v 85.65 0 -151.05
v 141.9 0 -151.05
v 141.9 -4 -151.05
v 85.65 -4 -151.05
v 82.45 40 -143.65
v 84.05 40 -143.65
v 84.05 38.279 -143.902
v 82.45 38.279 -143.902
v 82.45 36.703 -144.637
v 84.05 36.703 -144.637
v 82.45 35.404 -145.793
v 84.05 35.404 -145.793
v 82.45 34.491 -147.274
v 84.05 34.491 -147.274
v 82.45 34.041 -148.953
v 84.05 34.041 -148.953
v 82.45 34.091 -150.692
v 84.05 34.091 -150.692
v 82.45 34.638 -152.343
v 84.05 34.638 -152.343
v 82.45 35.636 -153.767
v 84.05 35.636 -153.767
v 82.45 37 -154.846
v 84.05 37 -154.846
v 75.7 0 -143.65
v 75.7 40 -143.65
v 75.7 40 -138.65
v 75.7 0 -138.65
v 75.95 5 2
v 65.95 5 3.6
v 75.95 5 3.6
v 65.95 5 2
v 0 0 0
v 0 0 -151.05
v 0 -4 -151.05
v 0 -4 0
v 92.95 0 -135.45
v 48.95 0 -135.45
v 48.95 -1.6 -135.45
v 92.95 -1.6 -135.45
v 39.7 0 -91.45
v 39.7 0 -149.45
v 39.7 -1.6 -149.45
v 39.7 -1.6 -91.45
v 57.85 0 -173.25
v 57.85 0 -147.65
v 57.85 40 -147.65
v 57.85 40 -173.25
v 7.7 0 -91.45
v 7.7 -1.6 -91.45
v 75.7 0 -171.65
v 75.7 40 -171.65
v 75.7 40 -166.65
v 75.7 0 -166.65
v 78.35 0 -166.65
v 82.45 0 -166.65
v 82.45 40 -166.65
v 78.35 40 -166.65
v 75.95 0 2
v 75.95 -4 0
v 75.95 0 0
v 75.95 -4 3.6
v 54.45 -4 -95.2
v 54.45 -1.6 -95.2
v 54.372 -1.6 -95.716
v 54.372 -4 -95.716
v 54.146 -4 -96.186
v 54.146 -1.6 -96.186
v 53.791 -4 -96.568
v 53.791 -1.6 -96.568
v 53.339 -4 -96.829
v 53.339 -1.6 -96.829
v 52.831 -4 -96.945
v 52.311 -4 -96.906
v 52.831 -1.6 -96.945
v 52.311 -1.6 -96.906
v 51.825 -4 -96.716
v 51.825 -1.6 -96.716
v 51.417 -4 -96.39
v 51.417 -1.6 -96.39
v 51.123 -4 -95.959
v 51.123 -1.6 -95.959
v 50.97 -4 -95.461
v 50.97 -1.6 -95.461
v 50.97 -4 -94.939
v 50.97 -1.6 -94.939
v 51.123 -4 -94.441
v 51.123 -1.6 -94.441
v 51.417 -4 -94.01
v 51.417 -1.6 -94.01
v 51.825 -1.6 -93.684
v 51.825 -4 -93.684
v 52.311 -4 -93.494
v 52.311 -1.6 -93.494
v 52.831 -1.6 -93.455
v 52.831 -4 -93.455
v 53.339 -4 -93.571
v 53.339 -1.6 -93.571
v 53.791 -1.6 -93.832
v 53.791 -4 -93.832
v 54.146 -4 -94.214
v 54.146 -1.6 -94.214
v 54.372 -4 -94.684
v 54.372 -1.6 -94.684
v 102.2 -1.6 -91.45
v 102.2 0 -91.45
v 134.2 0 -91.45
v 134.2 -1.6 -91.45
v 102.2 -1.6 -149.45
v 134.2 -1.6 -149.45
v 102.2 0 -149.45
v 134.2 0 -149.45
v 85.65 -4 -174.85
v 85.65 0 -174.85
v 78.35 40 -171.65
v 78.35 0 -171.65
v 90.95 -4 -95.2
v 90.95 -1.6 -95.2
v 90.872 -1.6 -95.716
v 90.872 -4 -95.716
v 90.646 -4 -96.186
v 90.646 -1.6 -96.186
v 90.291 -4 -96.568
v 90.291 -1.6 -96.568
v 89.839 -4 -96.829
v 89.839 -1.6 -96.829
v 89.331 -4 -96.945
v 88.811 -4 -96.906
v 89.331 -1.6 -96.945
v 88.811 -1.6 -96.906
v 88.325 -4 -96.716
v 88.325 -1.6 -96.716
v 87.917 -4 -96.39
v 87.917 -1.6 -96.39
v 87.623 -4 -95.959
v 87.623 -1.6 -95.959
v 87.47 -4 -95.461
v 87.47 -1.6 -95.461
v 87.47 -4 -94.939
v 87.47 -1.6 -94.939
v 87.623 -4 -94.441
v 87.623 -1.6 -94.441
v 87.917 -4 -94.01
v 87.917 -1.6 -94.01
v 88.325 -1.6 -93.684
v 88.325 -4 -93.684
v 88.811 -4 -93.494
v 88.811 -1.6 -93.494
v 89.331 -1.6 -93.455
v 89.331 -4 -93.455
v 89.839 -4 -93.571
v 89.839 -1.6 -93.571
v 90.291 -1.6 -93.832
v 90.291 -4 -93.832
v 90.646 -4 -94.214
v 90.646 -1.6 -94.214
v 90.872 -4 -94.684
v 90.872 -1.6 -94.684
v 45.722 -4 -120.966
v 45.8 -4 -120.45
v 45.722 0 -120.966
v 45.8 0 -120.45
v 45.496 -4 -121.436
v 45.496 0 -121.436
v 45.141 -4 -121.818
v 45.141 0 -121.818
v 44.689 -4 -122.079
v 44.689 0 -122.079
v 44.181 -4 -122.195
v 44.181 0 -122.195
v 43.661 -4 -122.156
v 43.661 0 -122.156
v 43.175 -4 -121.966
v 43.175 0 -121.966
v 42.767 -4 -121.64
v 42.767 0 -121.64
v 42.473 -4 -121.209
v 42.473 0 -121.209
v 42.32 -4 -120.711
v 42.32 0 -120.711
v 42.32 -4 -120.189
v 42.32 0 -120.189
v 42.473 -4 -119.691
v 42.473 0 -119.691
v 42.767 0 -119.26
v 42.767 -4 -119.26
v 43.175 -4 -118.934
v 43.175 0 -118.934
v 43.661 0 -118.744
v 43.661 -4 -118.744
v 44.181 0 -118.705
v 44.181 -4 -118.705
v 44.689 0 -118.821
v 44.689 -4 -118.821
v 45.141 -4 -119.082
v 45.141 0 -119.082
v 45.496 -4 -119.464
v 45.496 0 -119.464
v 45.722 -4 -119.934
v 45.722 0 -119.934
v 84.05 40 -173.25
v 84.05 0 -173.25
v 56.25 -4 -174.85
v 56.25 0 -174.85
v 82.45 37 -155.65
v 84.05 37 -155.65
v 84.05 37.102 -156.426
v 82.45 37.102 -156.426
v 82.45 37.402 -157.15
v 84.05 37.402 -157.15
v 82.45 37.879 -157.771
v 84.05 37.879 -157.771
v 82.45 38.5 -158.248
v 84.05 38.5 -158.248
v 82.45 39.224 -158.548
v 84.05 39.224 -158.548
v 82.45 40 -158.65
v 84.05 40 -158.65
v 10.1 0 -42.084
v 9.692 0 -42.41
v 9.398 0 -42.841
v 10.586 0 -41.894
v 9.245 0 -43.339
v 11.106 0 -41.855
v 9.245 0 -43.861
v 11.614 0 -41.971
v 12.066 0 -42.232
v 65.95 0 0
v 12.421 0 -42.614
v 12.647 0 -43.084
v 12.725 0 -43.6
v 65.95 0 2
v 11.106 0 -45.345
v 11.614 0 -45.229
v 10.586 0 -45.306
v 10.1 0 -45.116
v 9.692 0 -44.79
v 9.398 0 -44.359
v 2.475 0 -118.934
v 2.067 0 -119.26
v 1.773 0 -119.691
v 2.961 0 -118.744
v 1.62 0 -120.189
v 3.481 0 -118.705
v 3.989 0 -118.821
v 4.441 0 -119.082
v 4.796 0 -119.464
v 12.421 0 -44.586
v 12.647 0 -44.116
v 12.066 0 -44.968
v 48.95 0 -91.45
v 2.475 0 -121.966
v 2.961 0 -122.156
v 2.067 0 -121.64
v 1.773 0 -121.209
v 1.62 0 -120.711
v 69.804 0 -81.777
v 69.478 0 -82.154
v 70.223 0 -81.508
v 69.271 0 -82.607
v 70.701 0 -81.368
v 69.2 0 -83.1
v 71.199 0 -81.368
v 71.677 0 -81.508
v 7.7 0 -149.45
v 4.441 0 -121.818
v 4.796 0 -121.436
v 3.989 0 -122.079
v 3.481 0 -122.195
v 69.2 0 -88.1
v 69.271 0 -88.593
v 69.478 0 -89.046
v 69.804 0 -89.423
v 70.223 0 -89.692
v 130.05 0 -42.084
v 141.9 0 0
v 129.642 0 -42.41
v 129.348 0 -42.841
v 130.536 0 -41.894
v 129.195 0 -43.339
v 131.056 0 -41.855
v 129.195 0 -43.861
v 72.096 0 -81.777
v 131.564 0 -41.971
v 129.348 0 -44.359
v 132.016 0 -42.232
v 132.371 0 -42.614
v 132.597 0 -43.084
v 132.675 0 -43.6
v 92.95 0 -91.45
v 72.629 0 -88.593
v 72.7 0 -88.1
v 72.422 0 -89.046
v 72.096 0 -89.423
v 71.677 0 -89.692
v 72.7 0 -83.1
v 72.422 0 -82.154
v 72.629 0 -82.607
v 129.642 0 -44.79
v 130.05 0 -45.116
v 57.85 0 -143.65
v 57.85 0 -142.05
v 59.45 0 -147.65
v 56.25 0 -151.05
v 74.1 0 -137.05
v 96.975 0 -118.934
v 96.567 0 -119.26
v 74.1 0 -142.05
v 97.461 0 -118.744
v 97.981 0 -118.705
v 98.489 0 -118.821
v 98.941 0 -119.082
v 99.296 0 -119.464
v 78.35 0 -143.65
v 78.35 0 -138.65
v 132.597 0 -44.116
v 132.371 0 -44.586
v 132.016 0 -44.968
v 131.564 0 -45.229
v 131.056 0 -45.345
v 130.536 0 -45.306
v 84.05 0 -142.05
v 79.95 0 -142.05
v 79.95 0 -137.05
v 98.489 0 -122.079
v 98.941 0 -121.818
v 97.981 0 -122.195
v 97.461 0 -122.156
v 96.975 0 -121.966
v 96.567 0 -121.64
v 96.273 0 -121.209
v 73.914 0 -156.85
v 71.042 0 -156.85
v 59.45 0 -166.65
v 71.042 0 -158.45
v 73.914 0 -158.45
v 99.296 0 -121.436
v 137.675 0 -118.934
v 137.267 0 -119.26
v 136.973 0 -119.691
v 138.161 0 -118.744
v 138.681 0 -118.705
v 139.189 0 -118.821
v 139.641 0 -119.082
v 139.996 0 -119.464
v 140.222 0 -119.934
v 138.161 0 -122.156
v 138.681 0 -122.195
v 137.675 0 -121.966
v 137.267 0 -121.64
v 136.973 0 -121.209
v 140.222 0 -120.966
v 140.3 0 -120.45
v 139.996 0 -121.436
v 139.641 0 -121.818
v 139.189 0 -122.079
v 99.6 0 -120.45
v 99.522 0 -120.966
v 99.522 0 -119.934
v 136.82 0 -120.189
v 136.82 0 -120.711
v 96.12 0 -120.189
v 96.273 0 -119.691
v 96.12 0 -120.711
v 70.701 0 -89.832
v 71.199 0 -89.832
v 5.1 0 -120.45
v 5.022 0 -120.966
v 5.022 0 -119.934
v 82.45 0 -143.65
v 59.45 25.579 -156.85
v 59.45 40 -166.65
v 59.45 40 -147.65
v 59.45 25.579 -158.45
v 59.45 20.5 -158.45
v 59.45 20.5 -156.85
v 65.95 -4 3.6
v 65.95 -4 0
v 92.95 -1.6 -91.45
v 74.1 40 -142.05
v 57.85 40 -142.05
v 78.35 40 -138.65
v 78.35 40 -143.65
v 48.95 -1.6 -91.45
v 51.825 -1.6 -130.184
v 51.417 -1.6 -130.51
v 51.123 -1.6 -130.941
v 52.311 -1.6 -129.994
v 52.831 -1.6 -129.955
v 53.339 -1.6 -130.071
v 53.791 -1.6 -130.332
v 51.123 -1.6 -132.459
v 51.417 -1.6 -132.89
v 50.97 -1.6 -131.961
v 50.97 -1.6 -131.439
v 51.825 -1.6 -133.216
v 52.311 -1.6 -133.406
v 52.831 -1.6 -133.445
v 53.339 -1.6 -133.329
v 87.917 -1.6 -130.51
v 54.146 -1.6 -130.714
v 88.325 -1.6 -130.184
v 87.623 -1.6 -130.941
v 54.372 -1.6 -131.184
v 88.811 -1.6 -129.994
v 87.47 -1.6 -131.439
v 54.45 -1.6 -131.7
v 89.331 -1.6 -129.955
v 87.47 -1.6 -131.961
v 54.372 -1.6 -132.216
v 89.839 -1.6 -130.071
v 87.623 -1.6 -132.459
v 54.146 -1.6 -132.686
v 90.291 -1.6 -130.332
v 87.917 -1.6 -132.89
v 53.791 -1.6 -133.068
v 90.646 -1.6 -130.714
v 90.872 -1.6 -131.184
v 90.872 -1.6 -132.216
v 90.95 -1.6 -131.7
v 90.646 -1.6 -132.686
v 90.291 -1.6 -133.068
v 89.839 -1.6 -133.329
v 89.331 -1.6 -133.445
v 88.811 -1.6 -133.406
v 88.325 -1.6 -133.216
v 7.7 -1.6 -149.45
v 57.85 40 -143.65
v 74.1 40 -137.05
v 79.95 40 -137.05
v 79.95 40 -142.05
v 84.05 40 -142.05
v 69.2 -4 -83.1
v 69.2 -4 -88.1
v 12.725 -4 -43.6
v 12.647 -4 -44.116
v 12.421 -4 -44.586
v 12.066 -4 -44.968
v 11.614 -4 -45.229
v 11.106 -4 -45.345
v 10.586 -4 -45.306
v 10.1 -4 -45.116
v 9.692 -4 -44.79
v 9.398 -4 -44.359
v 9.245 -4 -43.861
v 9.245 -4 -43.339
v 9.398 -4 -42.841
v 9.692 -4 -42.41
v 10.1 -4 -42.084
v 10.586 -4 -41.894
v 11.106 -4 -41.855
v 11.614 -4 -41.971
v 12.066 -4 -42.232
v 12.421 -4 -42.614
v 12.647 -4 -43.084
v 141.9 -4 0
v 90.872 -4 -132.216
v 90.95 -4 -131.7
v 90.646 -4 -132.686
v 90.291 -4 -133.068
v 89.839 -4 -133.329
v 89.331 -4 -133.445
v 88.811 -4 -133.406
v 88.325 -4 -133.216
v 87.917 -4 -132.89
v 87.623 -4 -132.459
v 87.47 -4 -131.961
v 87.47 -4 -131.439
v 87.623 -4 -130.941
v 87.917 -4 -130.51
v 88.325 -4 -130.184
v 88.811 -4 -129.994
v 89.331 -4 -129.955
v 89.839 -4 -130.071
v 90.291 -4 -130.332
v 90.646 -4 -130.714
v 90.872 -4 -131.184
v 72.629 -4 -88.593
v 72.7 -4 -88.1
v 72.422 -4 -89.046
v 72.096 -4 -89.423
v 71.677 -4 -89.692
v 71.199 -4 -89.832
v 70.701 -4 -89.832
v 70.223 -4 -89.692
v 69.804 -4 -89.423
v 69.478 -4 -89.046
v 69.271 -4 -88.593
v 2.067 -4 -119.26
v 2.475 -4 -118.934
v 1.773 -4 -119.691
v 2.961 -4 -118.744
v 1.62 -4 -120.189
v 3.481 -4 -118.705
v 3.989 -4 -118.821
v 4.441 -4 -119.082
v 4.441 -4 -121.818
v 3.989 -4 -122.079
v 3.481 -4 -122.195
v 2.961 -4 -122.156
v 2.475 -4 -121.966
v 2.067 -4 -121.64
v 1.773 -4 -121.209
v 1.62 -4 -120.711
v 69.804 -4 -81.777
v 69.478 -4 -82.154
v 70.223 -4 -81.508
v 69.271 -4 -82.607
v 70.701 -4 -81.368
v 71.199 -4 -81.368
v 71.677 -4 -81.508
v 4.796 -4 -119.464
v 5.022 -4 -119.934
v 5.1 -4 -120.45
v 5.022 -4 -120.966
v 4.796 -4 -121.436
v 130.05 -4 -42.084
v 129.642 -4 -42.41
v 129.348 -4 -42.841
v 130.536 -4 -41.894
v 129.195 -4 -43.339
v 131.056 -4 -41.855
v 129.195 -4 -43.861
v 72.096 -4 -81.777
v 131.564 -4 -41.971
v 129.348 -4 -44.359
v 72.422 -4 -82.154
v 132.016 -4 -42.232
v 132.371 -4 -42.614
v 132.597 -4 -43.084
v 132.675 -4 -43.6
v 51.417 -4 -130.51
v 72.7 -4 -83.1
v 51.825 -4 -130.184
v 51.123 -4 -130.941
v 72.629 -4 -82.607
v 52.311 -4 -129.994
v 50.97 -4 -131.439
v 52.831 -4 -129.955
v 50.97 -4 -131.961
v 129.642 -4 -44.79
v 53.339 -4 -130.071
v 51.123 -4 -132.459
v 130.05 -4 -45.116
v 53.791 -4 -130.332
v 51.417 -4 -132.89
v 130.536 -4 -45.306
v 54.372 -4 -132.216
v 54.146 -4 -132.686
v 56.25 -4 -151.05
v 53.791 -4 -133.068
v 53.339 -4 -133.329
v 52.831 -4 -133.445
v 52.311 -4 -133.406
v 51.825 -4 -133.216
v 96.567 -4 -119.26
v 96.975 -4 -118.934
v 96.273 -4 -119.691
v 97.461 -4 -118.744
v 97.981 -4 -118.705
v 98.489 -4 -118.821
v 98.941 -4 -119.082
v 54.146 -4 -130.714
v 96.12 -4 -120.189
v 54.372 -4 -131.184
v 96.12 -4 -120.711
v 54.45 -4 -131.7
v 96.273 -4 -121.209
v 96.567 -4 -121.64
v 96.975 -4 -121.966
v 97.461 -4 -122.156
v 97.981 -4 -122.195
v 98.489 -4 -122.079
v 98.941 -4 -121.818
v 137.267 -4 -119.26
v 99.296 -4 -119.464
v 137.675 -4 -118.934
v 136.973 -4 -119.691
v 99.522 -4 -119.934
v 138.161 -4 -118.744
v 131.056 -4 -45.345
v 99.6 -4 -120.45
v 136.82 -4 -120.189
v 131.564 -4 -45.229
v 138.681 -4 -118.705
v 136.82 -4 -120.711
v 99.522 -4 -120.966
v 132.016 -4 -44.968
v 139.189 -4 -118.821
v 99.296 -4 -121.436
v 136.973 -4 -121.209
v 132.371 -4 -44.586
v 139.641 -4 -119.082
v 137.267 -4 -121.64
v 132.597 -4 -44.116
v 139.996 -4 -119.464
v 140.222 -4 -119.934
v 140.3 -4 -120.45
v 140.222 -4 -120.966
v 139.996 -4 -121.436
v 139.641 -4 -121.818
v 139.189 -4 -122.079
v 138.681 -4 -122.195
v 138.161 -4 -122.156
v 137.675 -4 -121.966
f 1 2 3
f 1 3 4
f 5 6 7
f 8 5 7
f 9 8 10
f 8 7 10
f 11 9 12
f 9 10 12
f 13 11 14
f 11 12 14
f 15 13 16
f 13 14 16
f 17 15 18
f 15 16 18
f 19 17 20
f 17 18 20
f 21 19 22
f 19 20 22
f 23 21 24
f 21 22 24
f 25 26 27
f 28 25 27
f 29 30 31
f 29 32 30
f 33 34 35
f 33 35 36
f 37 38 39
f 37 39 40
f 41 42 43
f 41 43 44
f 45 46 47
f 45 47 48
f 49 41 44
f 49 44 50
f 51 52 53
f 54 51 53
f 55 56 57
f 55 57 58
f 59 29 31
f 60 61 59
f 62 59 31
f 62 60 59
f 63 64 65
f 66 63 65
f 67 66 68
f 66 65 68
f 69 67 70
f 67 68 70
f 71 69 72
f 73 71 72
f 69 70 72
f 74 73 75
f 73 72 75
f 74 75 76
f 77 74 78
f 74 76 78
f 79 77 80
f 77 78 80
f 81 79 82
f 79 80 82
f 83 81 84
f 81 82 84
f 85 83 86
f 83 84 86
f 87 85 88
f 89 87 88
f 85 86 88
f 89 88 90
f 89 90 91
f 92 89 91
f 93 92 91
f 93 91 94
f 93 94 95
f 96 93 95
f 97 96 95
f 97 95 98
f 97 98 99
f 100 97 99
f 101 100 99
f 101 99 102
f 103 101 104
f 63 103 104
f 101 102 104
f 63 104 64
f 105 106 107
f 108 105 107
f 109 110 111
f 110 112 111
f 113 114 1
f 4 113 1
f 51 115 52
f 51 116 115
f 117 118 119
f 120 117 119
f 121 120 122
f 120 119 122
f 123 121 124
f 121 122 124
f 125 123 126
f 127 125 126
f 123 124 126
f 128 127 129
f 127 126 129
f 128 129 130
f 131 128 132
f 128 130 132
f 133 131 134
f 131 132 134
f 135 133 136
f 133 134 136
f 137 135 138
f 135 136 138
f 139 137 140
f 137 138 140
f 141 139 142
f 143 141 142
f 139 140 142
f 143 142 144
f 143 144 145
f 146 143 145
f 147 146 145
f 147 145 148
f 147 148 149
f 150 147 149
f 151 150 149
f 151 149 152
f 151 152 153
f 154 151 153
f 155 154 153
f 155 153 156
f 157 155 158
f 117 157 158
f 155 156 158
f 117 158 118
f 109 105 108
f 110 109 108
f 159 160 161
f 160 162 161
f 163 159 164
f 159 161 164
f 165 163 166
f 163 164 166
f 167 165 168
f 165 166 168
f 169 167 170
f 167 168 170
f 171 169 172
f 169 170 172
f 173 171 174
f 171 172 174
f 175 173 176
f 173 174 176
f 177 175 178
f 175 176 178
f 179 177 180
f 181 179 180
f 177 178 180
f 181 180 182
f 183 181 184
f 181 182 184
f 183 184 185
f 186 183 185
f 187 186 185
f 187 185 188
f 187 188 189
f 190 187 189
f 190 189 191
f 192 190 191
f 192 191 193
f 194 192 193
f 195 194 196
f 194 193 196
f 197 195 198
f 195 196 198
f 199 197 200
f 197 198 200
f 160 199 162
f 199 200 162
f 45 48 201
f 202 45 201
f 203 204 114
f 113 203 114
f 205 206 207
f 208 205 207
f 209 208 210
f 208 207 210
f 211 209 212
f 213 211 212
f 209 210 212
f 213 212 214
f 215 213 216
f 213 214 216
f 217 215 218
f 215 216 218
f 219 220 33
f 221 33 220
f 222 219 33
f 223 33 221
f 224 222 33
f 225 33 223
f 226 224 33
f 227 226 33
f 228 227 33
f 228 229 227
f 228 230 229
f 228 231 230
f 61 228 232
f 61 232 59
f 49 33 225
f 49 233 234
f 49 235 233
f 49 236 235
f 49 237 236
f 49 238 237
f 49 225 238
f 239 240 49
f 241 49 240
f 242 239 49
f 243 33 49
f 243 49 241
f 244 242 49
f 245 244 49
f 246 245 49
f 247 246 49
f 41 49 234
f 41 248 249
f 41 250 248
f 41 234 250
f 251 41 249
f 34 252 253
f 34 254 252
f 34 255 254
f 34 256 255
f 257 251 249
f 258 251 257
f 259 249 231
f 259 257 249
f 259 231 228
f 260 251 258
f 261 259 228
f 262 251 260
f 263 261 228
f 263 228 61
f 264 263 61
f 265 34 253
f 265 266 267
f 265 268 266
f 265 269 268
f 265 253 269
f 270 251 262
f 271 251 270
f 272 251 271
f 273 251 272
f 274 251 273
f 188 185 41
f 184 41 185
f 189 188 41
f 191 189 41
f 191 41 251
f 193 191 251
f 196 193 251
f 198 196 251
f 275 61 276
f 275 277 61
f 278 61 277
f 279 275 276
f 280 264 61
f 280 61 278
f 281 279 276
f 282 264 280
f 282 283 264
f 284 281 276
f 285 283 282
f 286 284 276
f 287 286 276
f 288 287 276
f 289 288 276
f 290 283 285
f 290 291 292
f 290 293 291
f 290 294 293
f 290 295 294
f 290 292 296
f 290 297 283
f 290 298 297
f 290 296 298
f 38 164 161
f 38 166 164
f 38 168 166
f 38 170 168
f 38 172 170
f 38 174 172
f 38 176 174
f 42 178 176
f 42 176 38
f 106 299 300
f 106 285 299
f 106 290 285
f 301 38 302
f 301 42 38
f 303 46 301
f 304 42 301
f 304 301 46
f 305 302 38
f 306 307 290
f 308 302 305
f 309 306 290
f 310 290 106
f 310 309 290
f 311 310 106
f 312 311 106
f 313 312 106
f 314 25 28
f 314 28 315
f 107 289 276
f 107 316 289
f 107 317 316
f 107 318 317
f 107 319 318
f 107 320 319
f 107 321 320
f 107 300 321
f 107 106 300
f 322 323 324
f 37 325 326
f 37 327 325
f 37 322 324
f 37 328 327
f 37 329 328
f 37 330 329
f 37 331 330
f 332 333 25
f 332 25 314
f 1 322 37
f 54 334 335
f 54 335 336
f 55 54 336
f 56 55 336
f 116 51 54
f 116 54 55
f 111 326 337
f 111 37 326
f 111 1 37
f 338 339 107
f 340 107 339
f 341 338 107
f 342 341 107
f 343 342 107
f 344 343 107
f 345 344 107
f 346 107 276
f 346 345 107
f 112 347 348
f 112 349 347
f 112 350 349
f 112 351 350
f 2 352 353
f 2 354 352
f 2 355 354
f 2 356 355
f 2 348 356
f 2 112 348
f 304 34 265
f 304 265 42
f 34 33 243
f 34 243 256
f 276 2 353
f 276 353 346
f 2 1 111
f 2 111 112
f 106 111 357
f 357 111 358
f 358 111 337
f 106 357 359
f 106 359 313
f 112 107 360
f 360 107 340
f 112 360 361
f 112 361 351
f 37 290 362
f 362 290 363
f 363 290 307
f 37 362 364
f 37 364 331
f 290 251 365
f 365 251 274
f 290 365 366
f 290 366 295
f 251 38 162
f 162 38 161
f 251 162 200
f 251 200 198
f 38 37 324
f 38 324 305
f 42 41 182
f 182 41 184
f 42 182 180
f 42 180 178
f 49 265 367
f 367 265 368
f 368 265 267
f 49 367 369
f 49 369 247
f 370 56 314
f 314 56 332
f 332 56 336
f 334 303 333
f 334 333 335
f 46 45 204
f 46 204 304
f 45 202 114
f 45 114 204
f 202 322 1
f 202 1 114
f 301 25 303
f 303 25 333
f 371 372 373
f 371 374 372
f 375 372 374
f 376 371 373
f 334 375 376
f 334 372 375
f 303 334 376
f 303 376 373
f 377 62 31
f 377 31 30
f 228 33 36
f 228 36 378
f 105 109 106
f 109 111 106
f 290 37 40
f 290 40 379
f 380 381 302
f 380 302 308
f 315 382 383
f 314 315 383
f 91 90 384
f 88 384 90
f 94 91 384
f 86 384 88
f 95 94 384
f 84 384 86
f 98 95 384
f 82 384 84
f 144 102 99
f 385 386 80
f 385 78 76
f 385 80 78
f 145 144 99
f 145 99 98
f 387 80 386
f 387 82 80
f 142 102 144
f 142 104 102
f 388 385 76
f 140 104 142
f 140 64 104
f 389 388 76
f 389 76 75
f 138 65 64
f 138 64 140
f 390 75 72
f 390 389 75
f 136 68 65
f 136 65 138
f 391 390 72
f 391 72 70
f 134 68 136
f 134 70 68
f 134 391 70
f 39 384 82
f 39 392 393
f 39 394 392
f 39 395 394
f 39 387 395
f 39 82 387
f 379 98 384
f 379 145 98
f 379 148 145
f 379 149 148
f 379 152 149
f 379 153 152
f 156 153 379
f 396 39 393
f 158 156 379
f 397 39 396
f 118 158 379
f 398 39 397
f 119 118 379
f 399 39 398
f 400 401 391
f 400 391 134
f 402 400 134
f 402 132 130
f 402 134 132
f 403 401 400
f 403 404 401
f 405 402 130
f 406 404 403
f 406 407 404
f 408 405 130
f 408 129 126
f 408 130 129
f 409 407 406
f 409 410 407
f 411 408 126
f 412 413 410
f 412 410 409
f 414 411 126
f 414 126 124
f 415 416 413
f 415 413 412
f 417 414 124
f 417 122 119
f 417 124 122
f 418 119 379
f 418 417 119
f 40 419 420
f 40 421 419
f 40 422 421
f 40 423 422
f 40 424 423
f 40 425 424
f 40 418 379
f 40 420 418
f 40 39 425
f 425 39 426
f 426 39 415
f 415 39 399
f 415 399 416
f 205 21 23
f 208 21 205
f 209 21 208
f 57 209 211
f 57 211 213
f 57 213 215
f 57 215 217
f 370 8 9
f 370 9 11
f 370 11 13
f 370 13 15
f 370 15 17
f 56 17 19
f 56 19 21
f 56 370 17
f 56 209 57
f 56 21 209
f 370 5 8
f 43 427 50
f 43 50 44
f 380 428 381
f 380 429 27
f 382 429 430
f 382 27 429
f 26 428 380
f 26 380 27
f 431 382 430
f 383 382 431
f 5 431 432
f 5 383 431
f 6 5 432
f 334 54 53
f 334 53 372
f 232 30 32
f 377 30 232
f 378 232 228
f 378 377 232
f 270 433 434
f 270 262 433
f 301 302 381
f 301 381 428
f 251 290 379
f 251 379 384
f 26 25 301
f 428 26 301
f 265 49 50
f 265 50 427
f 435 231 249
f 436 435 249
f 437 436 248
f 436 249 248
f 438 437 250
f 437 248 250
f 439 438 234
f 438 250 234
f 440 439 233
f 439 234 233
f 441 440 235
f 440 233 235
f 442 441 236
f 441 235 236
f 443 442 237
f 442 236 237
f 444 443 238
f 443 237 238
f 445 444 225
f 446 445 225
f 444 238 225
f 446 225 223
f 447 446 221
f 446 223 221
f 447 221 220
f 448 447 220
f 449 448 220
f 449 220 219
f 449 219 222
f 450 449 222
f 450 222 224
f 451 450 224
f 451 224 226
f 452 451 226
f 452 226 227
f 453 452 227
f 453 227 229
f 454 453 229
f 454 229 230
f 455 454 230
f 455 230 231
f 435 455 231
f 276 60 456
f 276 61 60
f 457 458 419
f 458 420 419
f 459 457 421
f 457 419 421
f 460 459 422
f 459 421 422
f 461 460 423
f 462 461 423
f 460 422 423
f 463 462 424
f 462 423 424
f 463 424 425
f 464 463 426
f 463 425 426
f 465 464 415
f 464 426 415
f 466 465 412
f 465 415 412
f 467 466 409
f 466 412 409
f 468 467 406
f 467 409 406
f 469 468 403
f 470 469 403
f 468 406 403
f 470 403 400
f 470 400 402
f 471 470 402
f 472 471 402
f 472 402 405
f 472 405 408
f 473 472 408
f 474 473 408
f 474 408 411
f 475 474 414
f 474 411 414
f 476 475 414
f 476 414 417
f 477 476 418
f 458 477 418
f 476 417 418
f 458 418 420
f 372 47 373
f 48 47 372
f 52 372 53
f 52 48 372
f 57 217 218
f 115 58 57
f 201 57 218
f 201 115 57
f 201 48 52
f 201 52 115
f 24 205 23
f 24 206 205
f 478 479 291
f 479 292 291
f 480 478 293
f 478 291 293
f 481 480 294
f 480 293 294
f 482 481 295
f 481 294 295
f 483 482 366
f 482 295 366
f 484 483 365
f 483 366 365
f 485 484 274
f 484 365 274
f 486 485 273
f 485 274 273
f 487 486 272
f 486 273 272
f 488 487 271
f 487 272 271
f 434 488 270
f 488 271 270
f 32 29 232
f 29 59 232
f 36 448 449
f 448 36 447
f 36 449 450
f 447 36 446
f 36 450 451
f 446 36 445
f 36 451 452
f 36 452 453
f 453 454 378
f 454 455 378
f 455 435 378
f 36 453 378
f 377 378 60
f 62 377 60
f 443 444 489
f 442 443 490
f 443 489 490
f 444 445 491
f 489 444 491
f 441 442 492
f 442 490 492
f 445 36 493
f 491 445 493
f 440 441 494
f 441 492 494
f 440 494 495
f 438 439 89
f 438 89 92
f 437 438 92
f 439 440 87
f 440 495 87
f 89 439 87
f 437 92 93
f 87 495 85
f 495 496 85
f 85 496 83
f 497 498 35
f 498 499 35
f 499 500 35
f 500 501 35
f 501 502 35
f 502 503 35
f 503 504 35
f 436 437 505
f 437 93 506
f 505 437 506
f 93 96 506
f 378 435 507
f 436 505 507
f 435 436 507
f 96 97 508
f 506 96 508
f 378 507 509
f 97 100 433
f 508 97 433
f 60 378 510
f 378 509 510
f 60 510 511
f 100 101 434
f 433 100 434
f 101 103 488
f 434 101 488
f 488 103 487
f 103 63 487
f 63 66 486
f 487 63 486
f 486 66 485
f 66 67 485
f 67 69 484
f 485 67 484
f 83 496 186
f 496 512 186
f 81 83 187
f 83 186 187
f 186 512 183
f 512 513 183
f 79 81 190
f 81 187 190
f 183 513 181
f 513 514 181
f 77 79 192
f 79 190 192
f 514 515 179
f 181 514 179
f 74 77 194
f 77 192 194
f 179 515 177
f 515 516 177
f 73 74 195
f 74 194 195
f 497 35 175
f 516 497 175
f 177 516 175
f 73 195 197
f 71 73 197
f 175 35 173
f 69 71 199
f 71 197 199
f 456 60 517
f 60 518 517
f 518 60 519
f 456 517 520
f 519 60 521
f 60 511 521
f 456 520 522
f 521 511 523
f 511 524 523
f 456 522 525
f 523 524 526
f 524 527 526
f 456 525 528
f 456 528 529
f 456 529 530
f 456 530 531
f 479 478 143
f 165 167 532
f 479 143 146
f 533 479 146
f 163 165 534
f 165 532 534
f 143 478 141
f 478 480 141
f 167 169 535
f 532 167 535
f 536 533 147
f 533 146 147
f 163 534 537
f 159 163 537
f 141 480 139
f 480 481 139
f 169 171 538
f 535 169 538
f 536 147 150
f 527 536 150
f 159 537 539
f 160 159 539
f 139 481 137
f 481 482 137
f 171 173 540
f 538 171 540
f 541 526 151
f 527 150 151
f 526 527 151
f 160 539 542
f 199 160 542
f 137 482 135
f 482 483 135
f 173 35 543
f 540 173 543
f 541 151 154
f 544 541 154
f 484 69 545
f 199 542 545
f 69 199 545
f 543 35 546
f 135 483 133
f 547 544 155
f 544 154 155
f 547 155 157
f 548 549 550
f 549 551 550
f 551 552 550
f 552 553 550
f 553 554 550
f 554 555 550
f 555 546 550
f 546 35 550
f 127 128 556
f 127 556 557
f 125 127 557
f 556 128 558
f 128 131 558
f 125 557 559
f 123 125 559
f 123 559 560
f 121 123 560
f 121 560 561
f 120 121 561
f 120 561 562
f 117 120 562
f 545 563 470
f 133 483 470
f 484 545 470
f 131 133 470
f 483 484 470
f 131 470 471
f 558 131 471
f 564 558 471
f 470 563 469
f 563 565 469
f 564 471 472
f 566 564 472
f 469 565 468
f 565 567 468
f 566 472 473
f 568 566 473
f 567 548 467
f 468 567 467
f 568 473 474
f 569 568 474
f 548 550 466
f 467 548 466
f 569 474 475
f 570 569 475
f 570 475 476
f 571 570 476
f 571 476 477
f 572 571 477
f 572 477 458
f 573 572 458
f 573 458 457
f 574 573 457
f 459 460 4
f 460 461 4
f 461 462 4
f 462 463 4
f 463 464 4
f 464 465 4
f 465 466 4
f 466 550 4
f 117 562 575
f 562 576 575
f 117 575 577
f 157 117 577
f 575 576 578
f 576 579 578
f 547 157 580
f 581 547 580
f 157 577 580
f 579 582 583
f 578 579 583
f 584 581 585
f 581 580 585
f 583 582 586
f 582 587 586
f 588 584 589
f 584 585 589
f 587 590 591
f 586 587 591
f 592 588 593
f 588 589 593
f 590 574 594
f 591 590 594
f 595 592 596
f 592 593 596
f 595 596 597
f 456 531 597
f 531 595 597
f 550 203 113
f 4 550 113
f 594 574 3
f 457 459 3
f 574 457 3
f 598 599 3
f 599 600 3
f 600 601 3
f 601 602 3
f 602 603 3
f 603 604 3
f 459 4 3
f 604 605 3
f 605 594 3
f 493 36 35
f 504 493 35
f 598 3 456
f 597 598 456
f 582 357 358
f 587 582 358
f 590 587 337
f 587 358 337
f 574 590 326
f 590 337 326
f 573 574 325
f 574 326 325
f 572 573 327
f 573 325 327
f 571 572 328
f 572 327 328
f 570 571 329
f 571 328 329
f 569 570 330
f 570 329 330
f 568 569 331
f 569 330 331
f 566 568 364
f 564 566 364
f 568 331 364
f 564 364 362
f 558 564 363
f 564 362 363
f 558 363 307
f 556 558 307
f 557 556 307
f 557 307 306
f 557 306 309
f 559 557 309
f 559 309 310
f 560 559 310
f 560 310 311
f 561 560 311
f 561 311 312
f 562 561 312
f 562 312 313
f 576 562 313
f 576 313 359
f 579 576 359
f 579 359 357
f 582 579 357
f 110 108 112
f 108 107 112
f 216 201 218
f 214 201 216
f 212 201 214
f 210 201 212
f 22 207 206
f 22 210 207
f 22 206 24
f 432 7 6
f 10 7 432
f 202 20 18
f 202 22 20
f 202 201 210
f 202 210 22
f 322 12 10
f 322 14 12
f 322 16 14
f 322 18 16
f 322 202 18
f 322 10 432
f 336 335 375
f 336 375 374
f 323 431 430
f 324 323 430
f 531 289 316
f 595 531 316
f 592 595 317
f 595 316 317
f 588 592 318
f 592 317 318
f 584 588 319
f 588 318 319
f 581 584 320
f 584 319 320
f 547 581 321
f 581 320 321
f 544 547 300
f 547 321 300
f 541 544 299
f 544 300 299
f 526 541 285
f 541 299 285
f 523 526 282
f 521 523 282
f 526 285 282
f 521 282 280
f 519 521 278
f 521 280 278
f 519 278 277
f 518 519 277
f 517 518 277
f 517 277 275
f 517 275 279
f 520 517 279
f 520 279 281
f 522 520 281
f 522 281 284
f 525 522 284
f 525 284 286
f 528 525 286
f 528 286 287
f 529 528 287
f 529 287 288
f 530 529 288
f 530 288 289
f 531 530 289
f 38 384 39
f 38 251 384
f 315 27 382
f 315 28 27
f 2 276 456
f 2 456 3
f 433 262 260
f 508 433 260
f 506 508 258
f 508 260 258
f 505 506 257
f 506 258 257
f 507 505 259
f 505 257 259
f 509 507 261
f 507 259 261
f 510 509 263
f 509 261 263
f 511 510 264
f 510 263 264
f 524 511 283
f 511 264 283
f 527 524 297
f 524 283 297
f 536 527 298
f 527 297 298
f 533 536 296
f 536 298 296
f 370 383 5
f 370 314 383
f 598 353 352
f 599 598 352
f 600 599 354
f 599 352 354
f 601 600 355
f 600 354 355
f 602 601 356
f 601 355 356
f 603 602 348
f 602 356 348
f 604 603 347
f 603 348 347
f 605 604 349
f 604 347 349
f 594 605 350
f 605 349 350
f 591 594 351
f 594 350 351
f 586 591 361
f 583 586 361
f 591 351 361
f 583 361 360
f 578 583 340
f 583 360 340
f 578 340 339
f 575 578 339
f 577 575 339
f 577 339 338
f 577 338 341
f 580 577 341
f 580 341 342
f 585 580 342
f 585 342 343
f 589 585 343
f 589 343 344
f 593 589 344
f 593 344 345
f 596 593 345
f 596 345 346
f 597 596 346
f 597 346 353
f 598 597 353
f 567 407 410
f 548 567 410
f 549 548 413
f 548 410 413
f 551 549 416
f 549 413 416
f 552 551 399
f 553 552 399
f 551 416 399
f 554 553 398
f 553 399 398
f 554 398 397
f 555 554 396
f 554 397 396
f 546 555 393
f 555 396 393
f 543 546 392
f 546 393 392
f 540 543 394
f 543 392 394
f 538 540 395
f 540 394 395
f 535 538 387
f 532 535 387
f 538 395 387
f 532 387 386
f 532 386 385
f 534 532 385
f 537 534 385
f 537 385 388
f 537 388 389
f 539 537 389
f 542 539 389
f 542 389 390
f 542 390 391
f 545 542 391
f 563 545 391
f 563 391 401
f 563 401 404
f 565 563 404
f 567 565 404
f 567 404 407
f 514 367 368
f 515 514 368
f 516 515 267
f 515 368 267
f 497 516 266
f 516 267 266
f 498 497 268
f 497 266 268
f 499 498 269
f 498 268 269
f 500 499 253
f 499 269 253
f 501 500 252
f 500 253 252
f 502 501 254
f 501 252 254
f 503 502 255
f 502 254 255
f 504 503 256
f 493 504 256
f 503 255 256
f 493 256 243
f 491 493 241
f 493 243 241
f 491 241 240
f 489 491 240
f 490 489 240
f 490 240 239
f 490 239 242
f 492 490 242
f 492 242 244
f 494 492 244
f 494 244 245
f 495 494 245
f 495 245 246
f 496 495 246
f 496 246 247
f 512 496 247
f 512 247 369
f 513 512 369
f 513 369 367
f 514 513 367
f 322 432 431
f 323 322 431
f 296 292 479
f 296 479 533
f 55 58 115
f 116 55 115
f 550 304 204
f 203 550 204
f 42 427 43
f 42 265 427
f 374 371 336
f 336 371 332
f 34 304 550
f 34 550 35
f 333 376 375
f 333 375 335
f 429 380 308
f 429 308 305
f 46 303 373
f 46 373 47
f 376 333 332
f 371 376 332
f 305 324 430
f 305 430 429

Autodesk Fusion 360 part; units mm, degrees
sketch "Sketch2" plane through (0, 0, 0) normal (1, 0, 0) x (0, 0, -1)
  line L0 (0, 0) -> (0, 10)
  dimension "d53" = 10
sketch "Sketch1" plane through (0, 0, 0) normal (0, 1, 0) x (1, 0, 0)
  line L0 (0, 0) -> (141.9, 0)
  line L1 (141.9, 0) -> (141.9, 151.05)
  line L2 (0, 151.05) -> (0, 0)
  line L3 (130.925, 43.6) -> (10.975, 43.6) construction
  circle A0 centre (10.975, 43.6) radius 1.75
  circle A1 centre (130.925, 43.6) radius 1.75
  line L4 (70.95, 0) -> (70.95, 43.6) construction
  line L5 (65.95, 0) -> (68.5, 0)
  line L6 (70.95, -2) -> (65.95, -2)
  line L7 (65.95, -2) -> (65.95, 0)
  line L8 (75.95, -2) -> (75.95, 0)
  line L9 (70.95, -2) -> (75.95, -2)
  line L10 (70.95, 43.6) -> (70.95, 85.6) construction
  line L11 (72.7, 88.1) -> (72.7, 83.1)
  line L12 (69.2, 83.1) -> (69.2, 88.1)
  arc A2 (72.7, 88.1) -> (69.2, 88.1) centre (70.95, 88.1) ccw
  arc A3 (69.2, 83.1) -> (72.7, 83.1) centre (70.95, 83.1) ccw
  line L13 (69.2, 85.6) -> (72.7, 85.6) construction
  line L14 (3.35, 120.45) -> (44.05, 120.45) construction
  circle A4 centre (3.35, 120.45) radius 1.75
  circle A5 centre (44.05, 120.45) radius 1.75
  line L15 (23.7, 151.05) -> (23.7, 120.45) construction
  line L16 (7.7, 149.45) -> (39.7, 149.45)
  line L17 (39.7, 149.45) -> (39.7, 91.45)
  line L18 (39.7, 91.45) -> (7.7, 91.45)
  line L19 (7.7, 91.45) -> (7.7, 149.45)
  line L20 (134.2, 91.45) -> (134.2, 149.45)
  line L21 (134.2, 149.45) -> (102.2, 149.45)
  line L22 (102.2, 149.45) -> (102.2, 91.45)
  circle A6 centre (138.55, 120.45) radius 1.75
  line L23 (102.2, 91.45) -> (134.2, 91.45)
  circle A7 centre (97.85, 120.45) radius 1.75
  line L24 (48.95, 135.45) -> (92.95, 135.45)
  line L25 (92.95, 135.45) -> (92.95, 91.45)
  line L26 (92.95, 91.45) -> (48.95, 91.45)
  line L27 (48.95, 91.45) -> (48.95, 135.45)
  line L28 (48.95, 113.45) -> (39.7, 113.45) construction
  line L29 (92.95, 113.45) -> (102.2, 113.45) construction
  circle A8 centre (52.7, 131.7) radius 1.75
  circle A9 centre (52.7, 95.2) radius 1.75
  circle A10 centre (89.2, 95.2) radius 1.75
  circle A11 centre (89.2, 131.7) radius 1.75
  line L30 (74.1, 142.05) -> (74.1, 137.05)
  line L31 (74.1, 173.25) -> (74.1, 168.25)
  line L32 (82.45, 143.65) -> (82.45, 166.65)
  line L33 (74.1, 173.25) -> (79.95, 173.25)
  line L34 (57.85, 142.05) -> (74.1, 142.05)
  line L35 (74.1, 168.25) -> (57.85, 168.25)
  line L36 (57.85, 142.05) -> (57.85, 168.25)
  line L37 (78.35, 138.65) -> (78.35, 143.65)
  line L38 (78.35, 166.65) -> (78.35, 171.65)
  line L39 (82.45, 166.65) -> (78.35, 166.65)
  line L40 (78.35, 143.65) -> (82.45, 143.65)
  line L41 (75.7, 166.65) -> (59.45, 166.65)
  line L42 (59.45, 166.65) -> (59.45, 143.65)
  line L43 (75.7, 171.65) -> (75.7, 166.65)
  line L44 (59.45, 143.65) -> (75.7, 143.65)
  line L45 (78.35, 171.65) -> (75.7, 171.65)
  line L46 (75.7, 138.65) -> (78.35, 138.65)
  line L47 (75.7, 143.65) -> (75.7, 138.65)
  line L48 (84.05, 142.05) -> (79.95, 142.05)
  line L49 (79.95, 137.05) -> (74.1, 137.05)
  line L50 (84.05, 168.25) -> (84.05, 142.05)
  line L51 (79.95, 142.05) -> (79.95, 137.05)
  line L52 (79.95, 168.25) -> (79.95, 173.25)
  line L53 (84.05, 168.25) -> (79.95, 168.25)
  line L54 (82.45, 155.15) -> (59.45, 155.15) construction
  line L55 (70.95, 155.15) -> (70.95, 135.45) construction
  line L56 (56.25, 151.05) -> (56.25, 174.85)
  line L57 (56.25, 174.85) -> (85.65, 174.85)
  line L58 (85.65, 174.85) -> (85.65, 151.05)
  line L59 (141.9, 151.05) -> (85.65, 151.05)
  line L60 (56.25, 151.05) -> (0, 151.05)
  line L61 (59.45, 143.65) -> (57.85, 143.65)
  line L62 (59.45, 147.65) -> (57.85, 147.65)
  line L63 (74.1, 173.25) -> (57.85, 173.25)
  line L64 (57.85, 173.25) -> (57.85, 168.25)
  line L65 (79.95, 173.25) -> (84.05, 173.25)
  line L66 (84.05, 173.25) -> (84.05, 168.25)
  line L67 (75.95, -2) -> (75.95, -3.6)
  line L68 (75.95, -3.6) -> (65.95, -3.6)
  line L69 (65.95, -3.6) -> (65.95, -2)
  point P0 (70.95, 113.45)
  point P1 (-289, 70)
  dimension "d1" = 141.9
  dimension "d2" = 151.05
  dimension "d3" = 119.95
  dimension "d4" = 3.5
  dimension "d6" = 5
  dimension "d8" = 43.6
  dimension "d9" = 42
  dimension "d10" = 3.5
  dimension "d11" = 5
  dimension "d12" = 40.7
  dimension "d13" = 3.5
  dimension "d14" = 3.35
  dimension "d15" = 30.6
  dimension "d16" = 58
  dimension "d17" = 1.6
  dimension "d18" = 32
  dimension "d19" = 16
  dimension "d20" = 44
  dimension "d23" = 44
  dimension "d24" = 3.35
  dimension "d25" = 3.5
  dimension "d26" = 3.75
  dimension "d27" = 3.75
  dimension "d28" = 22
  dimension "d29" = 22
  dimension "d31" = 360
  dimension "d32" = 4.9
  dimension "d33" = 4.9
  dimension "d34" = 1.6
  dimension "d35" = 1.6
  dimension "d36" = 1.6
  dimension "d37" = 1.6
  dimension "d38" = 1.6
  dimension "d39" = 1.6
  dimension "d40" = 1.6
  dimension "d41" = 1.6
  dimension "d42" = 1.6
  dimension "d43" = 1.6
  dimension "d44" = 1.6
  dimension "d45" = 1.6
  dimension "d47" = 5
  dimension "d48" = 23
  dimension "d49" = 23
  dimension "d50" = 4.1
  dimension "d51" = 6.75
  dimension "d54" = 1.6
  dimension "d55" = 1.6
  dimension "d56" = 1.6
  dimension "d57" = 1.6
  dimension "d58" = 4
  dimension "d80" = 2
  dimension "d81" = 1.6
extrude "Extrude1" add sketch "Sketch1" against normal blind 4 contours L0 L1 L2 L5 L56 L57 L58 L59 L60 | L0 L5 L6 L7 L8 L9 | L6 L9 L67 L68 L69 | L16 L17 L18 L19 | L20 L21 L22 L23 | L24 L25 L26 L27 | L30 L31 L32 L33 L34 L35 L36 L37 L38 L39 L40 L41 L42 L43 L44 L45 L46 L47 L48 L49 L50 L51 L52 L53 L61 L62 | L36 L42 L61 L62 | L32 L37 L38 L39 L40 L41 L42 L43 L44 L45 L46 L47 | L31 L35 L63 L64 | L52 L53 L65 L66
extrude "Extrude2" cut sketch "Sketch1" against normal blind 1.6 contours L16 L17 L18 L19 | L20 L21 L22 L23 | L24 L25 L26 L27
extrude "Extrude3" add sketch "Sketch1" along normal blind 5 contours L6 L9 L67 L68 L69
extrude "Extrude4" add sketch "Sketch1" along normal blind 40 contours L30 L31 L32 L33 L34 L35 L36 L37 L38 L39 L40 L41 L42 L43 L44 L45 L46 L47 L48 L49 L50 L51 L52 L53 L61 L62 | L31 L35 L63 L64 | L52 L53 L65 L66
sketch "Sketch3" plane through (84.05, 0, 0) normal (1, 0, 0) x (0, 0, -1)
  line L0 (142.05, 0) -> (173.25, 0)
  line L1 (173.25, 0) -> (173.25, 40)
  line L2 (173.25, 40) -> (142.05, 40)
  line L3 (142.05, 40) -> (142.05, 0)
  line L4 (143.65, 0) -> (143.65, 40)
  line L5 (155.65, 43) -> (154.8462, 43)
  line L6 (155.65, 37) -> (154.8462, 37)
  arc A0 (155.65, 37) -> (155.65, 43) centre (155.65, 40) ccw
  arc A1 (154.8462, 43) -> (154.8462, 37) centre (149.65, 40) ccw
  dimension "d69" = 6
  dimension "d70" = 12
  dimension "d71" = 6
extrude "Extrude6" cut sketch "Sketch3" against normal blind 5 contours L2 L6 A0 A1
ref_plane "WorkPlane1" through (66.775, 20, -157.65) normal (0, 0, -1) x (-1, 0, 0)
sketch "Sketch4" plane through (66.775, 20, -157.65) normal (0, 0, -1) x (1, 0, 0)
  line L0 (-7.325, 20) -> (-7.325, -20)
  line L1 (-7.325, -20) -> (-7.325, 20)
  line L2 (-7.325, -5.5787) -> (-7.325, -0.4998)
  line L3 (8.925, 20) -> (-7.325, 20)
  line L4 (-7.325, -5.5787) -> (7.1393, 20)
  line L5 (-7.325, -0.4998) -> (4.2673, 20)
  line L6 (4.2673, 20) -> (7.1393, 20)
  dimension "d77" = 2.5
extrude "Extrude7" add sketch "Sketch4" along normal mid plane 1.6 contours L0 L1 L2 L3 L4 L5 L6
equation "d15 = ( 58 / 2 ) * 1 mm + 1.6 mm"
equation "d34 = d44"
equation "d35 = d44"
equation "d36 = d44"
equation "d37 = d44"
equation "d38 = d44"
equation "d39 = d44"
equation "d40 = d44"
equation "d41 = d44"
equation "d42 = d44"
equation "d43 = d44"
equation "d45 = d44"
equation "d56 = d34"
equation "d57 = d55"
